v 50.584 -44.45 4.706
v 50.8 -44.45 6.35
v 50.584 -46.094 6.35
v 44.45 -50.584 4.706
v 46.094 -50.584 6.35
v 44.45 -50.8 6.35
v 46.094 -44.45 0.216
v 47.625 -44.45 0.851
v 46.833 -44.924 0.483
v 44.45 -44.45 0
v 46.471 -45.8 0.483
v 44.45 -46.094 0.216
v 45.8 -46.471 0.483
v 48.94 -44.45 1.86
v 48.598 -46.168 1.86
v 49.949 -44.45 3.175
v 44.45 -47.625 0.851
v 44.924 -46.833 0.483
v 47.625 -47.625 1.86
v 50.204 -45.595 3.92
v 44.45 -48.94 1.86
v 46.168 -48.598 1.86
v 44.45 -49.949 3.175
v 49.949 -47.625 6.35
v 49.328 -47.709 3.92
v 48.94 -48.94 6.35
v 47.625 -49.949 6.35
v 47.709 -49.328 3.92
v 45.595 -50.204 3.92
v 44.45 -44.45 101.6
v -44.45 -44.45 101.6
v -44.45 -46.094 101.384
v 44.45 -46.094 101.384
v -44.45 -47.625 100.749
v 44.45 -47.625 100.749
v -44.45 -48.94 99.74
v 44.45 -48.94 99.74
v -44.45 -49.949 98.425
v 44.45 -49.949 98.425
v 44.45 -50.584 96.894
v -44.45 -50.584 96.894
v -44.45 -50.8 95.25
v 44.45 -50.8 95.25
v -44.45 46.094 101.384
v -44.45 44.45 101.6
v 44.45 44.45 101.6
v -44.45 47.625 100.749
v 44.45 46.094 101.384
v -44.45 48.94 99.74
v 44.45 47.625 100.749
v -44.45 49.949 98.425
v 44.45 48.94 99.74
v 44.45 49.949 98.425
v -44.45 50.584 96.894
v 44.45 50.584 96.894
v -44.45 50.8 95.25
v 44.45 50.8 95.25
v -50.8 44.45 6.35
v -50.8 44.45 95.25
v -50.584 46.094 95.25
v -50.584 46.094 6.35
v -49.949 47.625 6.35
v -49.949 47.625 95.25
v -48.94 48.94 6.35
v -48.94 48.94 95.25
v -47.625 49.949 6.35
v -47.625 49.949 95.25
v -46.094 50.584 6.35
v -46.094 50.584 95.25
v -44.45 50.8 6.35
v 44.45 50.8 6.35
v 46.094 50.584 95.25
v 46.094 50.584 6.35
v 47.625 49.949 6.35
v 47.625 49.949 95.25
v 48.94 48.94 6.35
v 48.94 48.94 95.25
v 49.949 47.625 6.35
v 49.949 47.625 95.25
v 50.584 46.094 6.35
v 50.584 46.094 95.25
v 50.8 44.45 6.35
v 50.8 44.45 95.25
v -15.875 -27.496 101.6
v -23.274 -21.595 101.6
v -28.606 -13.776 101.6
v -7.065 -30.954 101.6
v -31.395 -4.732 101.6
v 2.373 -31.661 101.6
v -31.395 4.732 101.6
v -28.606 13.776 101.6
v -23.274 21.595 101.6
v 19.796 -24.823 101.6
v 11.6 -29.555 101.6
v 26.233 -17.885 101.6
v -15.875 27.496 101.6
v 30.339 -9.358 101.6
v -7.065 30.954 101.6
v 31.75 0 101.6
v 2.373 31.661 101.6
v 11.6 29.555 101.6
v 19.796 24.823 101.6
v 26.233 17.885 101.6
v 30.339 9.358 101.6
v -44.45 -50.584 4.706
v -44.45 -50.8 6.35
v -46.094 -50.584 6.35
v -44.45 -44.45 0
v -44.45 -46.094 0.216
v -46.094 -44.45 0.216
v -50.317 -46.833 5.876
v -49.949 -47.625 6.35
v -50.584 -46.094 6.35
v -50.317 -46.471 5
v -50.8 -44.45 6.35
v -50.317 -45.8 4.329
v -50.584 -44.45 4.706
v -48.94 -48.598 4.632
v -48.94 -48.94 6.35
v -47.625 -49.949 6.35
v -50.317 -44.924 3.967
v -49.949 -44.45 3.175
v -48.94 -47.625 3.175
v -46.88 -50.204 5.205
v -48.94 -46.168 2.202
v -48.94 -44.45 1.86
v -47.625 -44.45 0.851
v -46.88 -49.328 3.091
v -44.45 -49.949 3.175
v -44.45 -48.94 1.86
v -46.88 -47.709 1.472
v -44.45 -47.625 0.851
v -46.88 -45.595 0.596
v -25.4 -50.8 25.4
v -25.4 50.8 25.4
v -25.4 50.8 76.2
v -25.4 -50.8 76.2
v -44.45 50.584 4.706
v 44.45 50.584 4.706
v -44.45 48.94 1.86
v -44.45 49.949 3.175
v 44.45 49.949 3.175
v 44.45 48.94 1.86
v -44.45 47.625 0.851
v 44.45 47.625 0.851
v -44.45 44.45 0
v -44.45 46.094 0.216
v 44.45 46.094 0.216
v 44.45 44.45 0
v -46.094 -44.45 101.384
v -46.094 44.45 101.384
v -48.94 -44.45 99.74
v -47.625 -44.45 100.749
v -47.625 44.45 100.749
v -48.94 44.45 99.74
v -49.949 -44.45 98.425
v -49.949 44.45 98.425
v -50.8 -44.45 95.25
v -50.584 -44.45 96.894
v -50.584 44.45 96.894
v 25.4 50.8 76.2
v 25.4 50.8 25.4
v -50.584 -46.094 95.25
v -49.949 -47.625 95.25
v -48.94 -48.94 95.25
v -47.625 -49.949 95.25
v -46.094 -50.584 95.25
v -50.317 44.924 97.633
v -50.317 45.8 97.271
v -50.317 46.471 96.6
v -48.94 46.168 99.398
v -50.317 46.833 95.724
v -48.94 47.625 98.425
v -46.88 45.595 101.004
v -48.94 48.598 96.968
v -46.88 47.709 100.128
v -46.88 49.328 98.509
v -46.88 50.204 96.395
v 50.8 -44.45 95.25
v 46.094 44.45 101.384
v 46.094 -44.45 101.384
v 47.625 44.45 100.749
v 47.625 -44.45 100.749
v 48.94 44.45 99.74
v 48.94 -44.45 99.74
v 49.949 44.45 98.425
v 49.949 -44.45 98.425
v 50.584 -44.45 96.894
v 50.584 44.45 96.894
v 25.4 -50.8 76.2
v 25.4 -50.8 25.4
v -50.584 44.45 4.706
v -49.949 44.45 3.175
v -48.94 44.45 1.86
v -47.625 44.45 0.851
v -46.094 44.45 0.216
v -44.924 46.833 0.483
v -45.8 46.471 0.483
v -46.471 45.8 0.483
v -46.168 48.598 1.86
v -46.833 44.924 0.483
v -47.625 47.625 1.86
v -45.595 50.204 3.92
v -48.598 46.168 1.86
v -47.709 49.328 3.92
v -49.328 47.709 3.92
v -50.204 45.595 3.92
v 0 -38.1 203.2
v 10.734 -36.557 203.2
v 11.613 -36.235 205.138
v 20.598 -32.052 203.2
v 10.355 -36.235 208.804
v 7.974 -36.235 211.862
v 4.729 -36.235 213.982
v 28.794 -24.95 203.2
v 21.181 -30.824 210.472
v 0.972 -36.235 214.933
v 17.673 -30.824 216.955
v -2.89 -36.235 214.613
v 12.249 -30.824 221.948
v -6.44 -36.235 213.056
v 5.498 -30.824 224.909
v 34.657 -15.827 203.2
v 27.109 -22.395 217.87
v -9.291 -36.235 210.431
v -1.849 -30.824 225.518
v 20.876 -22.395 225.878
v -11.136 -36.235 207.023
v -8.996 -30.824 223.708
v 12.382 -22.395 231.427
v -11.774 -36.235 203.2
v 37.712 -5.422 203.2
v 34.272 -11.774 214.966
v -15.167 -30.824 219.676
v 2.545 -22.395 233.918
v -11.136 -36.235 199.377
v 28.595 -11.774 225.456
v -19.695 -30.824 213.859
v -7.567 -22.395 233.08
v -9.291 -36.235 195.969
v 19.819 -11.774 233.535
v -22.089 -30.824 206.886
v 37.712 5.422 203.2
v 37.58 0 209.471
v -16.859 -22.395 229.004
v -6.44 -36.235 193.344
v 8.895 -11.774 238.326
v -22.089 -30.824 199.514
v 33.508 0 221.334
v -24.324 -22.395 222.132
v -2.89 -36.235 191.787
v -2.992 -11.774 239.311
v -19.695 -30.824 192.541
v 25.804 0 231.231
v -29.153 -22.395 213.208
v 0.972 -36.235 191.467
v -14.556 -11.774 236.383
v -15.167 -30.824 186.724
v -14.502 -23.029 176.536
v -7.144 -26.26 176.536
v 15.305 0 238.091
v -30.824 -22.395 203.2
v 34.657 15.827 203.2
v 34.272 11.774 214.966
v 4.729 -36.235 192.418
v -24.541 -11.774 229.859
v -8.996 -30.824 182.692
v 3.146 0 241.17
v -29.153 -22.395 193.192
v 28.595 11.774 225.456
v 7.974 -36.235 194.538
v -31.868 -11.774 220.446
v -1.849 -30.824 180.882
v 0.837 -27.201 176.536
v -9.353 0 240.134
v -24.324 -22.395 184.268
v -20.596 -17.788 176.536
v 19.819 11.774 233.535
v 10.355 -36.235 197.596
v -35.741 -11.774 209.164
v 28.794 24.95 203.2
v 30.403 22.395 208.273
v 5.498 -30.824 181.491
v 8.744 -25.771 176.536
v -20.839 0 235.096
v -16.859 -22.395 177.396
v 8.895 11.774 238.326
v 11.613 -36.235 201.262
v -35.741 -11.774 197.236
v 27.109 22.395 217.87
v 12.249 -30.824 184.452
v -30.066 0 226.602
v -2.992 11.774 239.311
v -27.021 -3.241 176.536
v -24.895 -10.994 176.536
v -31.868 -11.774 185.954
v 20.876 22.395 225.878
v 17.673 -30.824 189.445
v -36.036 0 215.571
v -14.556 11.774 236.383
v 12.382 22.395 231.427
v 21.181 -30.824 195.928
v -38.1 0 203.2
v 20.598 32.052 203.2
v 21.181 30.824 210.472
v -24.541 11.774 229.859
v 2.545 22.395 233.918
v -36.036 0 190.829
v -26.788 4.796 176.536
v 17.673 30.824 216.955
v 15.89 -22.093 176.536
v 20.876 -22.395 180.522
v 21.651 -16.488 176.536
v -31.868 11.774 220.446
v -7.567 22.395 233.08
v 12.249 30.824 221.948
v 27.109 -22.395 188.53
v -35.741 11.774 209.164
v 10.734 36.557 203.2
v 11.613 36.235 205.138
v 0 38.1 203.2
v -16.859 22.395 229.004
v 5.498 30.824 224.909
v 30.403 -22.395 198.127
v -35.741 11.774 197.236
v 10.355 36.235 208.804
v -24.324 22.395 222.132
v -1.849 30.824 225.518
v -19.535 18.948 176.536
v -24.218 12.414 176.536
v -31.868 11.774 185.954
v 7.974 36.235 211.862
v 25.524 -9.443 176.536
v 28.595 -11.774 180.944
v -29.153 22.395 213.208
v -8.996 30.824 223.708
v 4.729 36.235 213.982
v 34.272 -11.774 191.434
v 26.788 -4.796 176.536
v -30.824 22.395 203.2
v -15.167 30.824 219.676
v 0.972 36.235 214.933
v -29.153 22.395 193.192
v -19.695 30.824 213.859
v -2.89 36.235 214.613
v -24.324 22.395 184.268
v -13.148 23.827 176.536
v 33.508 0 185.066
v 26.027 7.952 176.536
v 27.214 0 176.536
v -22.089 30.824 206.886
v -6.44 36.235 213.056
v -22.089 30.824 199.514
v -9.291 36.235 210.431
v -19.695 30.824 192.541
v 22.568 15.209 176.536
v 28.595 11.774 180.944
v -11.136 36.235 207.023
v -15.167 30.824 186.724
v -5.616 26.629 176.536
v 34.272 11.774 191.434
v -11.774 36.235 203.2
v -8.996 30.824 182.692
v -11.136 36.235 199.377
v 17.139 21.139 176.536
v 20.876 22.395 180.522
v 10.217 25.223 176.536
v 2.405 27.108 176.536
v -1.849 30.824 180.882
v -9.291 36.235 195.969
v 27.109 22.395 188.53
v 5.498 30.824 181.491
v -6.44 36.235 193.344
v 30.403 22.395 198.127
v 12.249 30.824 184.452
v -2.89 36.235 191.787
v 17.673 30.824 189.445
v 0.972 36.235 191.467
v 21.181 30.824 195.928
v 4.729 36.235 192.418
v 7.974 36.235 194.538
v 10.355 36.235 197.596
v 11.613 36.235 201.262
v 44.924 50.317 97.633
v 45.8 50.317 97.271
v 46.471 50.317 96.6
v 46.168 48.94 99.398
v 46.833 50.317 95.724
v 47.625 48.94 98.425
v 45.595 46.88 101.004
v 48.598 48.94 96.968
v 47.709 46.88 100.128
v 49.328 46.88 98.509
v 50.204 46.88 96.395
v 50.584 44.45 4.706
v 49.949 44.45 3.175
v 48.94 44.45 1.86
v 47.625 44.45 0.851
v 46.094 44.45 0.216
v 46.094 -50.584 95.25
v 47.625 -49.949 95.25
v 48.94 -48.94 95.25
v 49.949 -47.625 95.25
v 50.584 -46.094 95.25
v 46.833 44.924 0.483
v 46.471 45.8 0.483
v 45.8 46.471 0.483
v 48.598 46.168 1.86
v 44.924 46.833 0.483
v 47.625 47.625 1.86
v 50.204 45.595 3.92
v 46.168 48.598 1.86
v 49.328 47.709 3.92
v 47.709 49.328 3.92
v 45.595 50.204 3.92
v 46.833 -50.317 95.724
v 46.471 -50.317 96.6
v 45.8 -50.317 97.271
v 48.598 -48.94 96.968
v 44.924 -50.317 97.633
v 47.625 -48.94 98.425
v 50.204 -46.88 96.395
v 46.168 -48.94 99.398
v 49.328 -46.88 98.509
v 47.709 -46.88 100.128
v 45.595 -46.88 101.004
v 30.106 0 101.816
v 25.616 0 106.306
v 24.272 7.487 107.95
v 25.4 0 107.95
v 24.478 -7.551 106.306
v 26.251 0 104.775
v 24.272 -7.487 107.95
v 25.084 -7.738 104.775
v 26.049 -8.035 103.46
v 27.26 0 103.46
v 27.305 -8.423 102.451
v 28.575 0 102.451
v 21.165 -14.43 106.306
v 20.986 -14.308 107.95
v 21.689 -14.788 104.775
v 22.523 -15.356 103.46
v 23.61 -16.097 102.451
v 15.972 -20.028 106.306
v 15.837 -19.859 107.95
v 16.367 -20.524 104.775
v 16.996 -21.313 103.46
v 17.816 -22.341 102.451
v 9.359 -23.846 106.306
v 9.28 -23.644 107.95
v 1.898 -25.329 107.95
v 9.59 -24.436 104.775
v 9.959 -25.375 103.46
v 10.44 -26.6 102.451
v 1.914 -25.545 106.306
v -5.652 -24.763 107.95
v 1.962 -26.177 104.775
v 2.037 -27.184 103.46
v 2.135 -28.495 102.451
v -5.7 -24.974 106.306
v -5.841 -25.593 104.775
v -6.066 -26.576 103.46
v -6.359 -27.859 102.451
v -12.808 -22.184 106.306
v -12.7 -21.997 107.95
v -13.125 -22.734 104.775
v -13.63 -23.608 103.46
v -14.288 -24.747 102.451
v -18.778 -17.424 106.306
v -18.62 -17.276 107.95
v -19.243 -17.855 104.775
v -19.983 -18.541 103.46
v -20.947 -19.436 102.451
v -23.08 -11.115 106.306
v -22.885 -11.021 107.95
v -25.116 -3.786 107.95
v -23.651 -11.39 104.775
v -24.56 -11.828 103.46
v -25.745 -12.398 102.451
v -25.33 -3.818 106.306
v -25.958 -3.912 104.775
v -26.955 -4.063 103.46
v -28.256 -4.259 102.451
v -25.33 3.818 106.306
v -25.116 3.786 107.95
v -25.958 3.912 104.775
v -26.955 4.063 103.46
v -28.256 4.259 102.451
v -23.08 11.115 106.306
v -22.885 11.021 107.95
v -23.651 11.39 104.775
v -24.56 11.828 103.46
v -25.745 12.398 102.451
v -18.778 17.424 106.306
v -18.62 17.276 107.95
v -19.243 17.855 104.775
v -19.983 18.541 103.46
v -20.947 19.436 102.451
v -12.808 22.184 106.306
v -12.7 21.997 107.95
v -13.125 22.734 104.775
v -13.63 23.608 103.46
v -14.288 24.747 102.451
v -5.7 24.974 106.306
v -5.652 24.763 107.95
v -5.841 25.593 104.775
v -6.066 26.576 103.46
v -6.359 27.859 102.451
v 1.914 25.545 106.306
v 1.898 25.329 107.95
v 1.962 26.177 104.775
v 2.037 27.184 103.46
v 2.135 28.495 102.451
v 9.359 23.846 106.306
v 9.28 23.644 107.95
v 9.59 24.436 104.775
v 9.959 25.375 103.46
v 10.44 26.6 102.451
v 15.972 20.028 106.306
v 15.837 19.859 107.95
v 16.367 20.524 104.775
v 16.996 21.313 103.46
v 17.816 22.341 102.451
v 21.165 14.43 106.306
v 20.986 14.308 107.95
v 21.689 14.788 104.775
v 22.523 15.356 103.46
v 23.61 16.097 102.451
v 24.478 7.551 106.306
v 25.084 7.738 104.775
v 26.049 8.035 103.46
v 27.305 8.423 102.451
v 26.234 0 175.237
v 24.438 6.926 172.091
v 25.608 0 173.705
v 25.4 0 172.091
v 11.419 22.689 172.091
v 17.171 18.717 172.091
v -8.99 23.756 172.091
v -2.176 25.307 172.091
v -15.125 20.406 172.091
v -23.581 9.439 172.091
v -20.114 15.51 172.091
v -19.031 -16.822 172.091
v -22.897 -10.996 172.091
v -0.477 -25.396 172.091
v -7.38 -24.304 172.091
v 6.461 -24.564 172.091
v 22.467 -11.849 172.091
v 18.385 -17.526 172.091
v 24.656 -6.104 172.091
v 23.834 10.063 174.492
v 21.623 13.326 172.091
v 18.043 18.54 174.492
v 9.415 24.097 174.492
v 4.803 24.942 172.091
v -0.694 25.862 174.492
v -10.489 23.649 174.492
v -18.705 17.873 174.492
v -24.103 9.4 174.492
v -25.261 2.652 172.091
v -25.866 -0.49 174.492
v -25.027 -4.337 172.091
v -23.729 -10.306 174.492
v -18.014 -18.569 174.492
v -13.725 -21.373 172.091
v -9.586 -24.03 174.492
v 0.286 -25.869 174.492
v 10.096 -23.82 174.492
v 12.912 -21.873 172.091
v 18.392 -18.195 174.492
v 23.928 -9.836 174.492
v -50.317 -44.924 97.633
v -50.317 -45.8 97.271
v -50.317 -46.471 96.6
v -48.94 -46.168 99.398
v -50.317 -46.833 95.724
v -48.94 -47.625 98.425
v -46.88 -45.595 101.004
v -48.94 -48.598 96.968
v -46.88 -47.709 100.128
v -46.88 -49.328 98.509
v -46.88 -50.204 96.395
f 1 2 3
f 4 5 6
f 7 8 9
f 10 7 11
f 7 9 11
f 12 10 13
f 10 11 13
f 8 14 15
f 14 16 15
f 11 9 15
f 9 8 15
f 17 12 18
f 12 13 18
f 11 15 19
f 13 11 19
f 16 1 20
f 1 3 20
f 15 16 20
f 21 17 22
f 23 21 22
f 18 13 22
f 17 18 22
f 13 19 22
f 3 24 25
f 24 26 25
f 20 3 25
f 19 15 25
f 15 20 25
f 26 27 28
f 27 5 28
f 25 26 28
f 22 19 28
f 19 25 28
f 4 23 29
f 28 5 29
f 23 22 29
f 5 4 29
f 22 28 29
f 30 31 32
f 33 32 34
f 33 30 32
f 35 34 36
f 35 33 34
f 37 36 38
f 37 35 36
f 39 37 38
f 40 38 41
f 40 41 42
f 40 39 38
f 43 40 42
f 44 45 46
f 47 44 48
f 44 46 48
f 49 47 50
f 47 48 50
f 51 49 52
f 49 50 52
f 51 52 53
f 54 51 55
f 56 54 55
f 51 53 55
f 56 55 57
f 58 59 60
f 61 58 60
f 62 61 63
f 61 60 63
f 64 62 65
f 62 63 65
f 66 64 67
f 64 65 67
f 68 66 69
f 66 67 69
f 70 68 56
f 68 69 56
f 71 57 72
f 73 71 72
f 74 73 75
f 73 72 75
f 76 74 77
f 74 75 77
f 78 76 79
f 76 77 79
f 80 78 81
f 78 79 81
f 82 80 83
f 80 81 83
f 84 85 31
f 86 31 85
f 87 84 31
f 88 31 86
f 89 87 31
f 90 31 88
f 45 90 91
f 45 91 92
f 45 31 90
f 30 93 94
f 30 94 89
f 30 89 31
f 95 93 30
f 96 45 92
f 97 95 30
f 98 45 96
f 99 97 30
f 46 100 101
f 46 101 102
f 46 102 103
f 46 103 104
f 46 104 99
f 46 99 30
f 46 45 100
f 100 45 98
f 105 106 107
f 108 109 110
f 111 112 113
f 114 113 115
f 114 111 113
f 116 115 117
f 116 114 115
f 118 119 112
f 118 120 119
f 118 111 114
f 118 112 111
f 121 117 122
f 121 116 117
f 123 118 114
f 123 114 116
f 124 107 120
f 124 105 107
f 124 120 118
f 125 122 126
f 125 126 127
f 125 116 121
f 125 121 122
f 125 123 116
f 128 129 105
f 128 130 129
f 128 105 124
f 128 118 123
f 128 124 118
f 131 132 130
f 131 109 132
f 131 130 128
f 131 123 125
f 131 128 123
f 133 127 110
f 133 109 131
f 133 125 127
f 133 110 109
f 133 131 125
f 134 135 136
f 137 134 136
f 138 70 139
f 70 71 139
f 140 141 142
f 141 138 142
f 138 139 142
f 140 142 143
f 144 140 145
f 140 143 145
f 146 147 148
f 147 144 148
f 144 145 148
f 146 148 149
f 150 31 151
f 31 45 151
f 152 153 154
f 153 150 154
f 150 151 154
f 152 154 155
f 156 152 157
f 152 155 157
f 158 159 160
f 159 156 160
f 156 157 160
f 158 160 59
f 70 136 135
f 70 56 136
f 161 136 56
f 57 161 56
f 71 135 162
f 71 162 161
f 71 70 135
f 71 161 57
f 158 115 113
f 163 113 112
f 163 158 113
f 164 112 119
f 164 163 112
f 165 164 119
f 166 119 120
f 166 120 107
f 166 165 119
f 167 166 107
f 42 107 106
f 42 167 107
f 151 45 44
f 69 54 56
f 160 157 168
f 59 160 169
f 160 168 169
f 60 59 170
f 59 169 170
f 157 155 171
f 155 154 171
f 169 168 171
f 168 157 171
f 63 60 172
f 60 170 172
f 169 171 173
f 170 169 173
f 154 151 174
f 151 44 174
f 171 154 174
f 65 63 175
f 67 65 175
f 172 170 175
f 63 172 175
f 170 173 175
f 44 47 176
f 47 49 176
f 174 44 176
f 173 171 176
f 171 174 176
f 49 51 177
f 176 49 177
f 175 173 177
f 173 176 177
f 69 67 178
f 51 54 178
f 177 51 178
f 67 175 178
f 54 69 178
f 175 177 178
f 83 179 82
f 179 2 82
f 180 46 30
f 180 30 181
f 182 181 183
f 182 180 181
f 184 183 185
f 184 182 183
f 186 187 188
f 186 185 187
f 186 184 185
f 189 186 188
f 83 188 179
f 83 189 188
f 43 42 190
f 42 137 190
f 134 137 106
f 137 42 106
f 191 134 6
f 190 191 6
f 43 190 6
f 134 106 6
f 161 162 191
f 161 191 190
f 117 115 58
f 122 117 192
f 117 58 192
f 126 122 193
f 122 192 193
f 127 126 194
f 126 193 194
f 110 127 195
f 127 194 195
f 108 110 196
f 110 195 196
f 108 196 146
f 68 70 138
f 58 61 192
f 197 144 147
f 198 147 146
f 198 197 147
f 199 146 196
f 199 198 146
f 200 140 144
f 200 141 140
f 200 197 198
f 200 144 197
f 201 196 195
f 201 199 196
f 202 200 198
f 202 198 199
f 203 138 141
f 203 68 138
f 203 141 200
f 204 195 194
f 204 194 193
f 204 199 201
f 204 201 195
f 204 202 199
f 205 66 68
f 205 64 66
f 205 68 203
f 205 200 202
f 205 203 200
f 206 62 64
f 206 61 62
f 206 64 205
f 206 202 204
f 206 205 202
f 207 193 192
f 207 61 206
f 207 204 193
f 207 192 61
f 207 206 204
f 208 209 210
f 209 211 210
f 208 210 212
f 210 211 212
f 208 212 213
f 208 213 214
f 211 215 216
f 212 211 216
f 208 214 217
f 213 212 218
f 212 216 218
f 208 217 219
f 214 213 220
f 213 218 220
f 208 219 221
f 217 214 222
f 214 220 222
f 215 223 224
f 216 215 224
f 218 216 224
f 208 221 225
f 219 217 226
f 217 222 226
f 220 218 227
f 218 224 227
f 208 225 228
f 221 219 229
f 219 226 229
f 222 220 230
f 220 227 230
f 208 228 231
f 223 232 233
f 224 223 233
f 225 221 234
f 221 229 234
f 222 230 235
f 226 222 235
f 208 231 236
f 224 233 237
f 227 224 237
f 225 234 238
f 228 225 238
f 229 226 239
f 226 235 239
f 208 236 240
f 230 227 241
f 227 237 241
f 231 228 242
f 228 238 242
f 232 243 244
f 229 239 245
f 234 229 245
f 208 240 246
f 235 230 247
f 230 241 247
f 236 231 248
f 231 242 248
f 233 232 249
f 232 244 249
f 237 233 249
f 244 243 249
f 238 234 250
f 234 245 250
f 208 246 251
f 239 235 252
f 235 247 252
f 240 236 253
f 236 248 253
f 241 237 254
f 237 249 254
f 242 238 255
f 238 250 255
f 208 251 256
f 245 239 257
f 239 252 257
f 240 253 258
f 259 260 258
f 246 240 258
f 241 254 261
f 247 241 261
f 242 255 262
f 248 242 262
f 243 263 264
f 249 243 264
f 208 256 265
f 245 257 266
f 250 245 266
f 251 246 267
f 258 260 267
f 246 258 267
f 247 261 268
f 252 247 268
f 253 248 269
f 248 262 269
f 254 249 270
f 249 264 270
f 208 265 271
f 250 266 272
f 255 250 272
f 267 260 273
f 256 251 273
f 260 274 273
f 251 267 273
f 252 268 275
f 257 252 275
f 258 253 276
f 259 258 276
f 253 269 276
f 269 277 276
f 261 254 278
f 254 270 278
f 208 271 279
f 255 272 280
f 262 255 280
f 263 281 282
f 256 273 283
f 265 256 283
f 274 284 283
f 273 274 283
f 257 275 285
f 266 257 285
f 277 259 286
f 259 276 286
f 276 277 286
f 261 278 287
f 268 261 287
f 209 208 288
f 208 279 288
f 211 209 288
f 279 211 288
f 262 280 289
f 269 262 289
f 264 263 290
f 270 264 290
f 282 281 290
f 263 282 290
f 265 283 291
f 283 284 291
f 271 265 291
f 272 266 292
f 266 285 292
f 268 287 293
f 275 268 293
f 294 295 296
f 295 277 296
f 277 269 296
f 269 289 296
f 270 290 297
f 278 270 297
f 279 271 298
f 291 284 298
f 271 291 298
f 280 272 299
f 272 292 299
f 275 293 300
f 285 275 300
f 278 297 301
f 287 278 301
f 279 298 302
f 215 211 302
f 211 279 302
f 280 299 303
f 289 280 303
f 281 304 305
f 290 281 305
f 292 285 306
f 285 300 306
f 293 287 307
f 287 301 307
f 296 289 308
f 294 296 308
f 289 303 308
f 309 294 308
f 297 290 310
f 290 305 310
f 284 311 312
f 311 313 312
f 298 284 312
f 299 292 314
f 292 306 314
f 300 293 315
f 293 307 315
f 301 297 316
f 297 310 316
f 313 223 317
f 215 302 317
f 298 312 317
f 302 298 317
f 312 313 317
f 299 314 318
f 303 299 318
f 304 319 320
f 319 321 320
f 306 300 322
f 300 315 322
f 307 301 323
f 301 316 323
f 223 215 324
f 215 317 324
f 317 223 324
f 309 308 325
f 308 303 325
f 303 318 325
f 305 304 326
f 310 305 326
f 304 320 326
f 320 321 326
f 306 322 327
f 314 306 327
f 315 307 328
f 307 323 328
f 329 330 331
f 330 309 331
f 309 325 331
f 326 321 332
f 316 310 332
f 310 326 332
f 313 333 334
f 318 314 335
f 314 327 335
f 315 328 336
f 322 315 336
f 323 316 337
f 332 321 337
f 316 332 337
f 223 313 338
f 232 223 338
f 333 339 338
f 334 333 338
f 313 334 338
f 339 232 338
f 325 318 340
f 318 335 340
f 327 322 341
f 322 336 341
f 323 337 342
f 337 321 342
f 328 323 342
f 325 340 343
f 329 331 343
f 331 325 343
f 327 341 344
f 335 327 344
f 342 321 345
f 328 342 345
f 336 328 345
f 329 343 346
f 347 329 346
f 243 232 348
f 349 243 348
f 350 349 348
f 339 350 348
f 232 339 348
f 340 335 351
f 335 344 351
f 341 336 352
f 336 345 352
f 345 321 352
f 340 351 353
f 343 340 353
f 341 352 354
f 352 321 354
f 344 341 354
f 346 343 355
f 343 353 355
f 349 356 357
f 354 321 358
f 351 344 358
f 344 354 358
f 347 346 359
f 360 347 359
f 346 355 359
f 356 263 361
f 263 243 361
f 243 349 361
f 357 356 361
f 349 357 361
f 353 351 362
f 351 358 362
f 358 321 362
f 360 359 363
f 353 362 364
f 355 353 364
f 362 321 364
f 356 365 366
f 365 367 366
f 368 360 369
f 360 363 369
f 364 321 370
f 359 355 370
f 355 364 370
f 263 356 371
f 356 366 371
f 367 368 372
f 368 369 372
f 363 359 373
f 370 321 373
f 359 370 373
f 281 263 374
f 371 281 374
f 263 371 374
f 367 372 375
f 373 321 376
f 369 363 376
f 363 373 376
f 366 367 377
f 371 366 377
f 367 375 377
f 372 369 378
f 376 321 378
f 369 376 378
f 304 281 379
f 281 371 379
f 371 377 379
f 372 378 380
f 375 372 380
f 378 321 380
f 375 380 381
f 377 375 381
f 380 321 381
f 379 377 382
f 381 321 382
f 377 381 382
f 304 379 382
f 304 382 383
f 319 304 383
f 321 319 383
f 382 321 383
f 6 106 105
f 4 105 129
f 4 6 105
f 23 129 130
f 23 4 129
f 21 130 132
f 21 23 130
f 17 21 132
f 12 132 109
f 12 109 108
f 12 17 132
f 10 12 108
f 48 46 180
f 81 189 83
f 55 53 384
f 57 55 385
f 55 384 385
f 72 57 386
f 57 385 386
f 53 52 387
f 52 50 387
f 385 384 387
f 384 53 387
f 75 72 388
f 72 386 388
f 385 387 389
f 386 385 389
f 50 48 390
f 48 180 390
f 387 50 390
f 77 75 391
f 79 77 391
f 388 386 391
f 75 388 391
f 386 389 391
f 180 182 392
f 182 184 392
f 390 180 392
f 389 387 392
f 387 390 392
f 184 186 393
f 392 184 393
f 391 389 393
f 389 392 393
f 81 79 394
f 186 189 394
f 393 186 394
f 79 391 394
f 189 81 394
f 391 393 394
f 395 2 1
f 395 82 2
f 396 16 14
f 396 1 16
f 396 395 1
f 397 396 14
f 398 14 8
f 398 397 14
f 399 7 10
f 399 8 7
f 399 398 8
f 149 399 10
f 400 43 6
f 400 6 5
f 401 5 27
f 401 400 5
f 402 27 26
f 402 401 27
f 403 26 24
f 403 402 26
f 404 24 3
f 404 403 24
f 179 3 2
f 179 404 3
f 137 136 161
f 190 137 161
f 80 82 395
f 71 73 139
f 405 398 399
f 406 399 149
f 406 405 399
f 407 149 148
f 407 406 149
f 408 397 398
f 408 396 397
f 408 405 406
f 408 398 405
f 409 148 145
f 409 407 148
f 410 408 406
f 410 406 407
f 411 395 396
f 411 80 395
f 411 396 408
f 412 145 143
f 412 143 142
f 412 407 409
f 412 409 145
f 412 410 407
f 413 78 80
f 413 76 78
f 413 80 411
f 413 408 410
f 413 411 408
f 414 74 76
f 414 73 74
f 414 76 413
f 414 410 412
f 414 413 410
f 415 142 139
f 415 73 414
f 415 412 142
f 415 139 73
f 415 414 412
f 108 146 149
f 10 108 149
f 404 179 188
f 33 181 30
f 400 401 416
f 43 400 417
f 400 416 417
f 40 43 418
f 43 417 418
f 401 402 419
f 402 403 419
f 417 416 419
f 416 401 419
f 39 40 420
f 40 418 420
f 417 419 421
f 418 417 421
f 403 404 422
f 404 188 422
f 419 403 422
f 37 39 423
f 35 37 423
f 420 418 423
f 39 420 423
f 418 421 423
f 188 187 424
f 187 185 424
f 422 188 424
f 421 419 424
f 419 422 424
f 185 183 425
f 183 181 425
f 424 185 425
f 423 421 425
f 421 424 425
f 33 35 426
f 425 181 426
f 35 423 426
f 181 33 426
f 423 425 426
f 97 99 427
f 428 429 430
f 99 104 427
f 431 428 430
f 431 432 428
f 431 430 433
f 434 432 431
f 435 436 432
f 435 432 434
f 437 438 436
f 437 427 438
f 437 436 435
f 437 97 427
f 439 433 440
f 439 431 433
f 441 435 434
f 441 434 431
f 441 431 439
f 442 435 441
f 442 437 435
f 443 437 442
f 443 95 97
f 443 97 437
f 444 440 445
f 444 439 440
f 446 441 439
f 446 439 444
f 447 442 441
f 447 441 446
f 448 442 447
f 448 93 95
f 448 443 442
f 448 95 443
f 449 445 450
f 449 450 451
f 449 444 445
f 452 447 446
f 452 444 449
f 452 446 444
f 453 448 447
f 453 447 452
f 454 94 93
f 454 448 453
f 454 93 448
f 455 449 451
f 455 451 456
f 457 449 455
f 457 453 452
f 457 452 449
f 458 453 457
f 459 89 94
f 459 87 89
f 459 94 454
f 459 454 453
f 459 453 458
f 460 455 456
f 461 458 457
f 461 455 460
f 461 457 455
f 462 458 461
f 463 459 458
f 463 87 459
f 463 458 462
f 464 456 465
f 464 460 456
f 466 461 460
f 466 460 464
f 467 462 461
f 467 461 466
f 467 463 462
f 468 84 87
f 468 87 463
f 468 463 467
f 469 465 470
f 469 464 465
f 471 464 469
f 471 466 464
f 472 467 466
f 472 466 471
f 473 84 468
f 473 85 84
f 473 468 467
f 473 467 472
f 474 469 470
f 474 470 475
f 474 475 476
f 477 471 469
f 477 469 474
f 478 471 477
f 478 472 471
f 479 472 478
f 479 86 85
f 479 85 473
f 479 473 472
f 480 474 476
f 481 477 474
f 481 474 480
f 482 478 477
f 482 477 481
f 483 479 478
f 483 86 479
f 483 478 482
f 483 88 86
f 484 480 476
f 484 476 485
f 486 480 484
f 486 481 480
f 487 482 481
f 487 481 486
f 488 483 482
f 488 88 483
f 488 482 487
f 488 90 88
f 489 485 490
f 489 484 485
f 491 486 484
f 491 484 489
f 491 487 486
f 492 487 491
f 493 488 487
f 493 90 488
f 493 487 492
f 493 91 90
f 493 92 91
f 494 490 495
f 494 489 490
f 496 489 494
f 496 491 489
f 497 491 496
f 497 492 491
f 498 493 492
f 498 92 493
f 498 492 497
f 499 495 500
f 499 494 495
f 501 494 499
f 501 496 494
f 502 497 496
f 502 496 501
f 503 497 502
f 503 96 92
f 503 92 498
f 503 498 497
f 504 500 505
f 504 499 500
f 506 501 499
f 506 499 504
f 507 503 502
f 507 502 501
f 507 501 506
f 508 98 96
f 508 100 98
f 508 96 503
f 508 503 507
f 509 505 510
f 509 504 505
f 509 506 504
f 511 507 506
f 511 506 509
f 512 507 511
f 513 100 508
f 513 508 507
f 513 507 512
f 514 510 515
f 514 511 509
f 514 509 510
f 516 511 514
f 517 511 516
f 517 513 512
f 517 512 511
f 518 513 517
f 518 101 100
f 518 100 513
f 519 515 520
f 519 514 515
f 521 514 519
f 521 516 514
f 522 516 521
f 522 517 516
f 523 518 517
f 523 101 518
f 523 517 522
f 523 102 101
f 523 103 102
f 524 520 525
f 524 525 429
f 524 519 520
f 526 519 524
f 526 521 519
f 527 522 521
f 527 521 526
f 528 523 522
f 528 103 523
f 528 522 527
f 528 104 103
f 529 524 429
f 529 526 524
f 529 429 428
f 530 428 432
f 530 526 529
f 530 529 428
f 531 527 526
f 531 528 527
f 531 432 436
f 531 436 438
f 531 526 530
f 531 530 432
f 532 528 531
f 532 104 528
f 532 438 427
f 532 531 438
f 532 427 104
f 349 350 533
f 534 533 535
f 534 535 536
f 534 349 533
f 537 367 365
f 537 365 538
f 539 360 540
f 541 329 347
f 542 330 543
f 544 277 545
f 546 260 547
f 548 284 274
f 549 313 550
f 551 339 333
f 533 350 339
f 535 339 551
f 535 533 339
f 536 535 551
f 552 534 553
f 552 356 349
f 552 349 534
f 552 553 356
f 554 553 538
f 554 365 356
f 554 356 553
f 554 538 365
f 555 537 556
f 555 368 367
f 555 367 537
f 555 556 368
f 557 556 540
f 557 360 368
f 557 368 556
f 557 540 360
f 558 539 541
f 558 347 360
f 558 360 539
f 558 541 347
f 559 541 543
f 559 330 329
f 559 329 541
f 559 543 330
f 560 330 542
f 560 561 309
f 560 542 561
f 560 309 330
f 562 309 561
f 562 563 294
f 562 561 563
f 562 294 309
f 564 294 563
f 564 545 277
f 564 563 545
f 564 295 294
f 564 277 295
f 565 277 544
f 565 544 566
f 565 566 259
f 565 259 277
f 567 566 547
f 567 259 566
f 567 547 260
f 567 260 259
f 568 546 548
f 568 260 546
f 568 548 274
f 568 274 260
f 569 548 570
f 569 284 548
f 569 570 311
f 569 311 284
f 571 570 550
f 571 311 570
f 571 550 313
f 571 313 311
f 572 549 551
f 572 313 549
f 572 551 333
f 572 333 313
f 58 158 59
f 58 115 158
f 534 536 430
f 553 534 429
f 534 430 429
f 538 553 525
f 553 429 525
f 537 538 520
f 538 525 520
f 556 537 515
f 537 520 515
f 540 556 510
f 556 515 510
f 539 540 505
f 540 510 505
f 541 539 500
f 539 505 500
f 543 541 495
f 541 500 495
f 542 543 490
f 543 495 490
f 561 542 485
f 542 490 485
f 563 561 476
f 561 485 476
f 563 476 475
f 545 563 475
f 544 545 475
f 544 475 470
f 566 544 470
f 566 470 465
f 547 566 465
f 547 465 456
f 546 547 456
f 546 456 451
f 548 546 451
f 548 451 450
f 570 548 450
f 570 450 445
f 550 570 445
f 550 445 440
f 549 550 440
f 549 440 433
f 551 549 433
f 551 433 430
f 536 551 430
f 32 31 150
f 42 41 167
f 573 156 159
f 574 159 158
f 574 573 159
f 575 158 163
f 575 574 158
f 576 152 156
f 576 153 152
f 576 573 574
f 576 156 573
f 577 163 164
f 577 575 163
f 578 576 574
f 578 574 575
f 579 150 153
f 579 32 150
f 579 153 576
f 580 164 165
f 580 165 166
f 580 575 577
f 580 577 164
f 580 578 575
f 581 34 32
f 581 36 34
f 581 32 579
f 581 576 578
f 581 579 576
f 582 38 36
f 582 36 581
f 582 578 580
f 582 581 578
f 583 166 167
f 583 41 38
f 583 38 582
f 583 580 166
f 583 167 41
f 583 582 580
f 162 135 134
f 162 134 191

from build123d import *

# Parameters (mm, degrees)
F0_W     = 101.6
F0_H     = 101.6
F1_DEPTH = 101.6
F2_R     = 25.4
F3_DEPTH = 203.2
F6_W     = 50.8
F6_H     = 50.8
F7_DEPTH = 101.6
F8_R     = 6.35


with BuildPart() as f1:
    # F0 (on Top) → F1 (new body)
    with BuildSketch(Plane.XY):
        Rectangle(F0_W, F0_H)
    extrude(amount=F1_DEPTH)

    # F2 (on Top) → F3 (join)
    with BuildSketch(Plane.XY):
        Circle(F2_R)
    extrude(amount=F3_DEPTH)

    # F4 (on face) → F5 (revolve)
    with BuildSketch(Plane.XY.offset(203.2)):
        with BuildLine():
            Line((0, -25.4), (0, -38.1))
            ThreePointArc((0, -38.1), (38.1, 0), (0, 38.1))
            Line((0, 38.1), (0, 25.4))
            ThreePointArc((0, 25.4), (17.9605122421, 17.9605122421), (25.4, 0))
            ThreePointArc((25.4, 0), (17.9605122421, -17.9605122421), (0, -25.4))
        make_face()
        with BuildLine():
            Line((0, 25.4), (0, -25.4))
            ThreePointArc((0, -25.4), (17.9605122421, -17.9605122421), (25.4, 0))
            ThreePointArc((25.4, 0), (17.9605122421, 17.9605122421), (0, 25.4))
        make_face()
    revolve(axis=Axis((0, 0, 203.2), (0, -1, 0)))

    # F6 (on face) → F7 (cut)
    with BuildSketch(Plane.XZ.offset(50.8)):
        with Locations((0, 50.8)):
            Rectangle(F6_W, F6_H)
    extrude(amount=-F7_DEPTH, mode=Mode.SUBTRACT)

    # F8
    f8_edges = [f1.edges().sort_by_distance(p)[0] for p in [
        (-25.4, 0, 101.6),
        (50.8, 0, 101.6),
        (50.8, -50.8, 50.8),
        (0, -50.8, 101.6),
        (0, 50.8, 101.6),
        (-50.8, 0, 101.6),
        (-25.4, 0, 174.801937),
        (50.8, 50.8, 50.8),
        (50.8, 0, 0),
        (0, -50.8, 0),
        (-50.8, -50.8, 50.8),
        (-50.8, 50.8, 50.8),
        (0, 50.8, 0),
        (-50.8, 0, 0),
    ]]
    fillet(f8_edges, radius=F8_R)


solid = f1.part
